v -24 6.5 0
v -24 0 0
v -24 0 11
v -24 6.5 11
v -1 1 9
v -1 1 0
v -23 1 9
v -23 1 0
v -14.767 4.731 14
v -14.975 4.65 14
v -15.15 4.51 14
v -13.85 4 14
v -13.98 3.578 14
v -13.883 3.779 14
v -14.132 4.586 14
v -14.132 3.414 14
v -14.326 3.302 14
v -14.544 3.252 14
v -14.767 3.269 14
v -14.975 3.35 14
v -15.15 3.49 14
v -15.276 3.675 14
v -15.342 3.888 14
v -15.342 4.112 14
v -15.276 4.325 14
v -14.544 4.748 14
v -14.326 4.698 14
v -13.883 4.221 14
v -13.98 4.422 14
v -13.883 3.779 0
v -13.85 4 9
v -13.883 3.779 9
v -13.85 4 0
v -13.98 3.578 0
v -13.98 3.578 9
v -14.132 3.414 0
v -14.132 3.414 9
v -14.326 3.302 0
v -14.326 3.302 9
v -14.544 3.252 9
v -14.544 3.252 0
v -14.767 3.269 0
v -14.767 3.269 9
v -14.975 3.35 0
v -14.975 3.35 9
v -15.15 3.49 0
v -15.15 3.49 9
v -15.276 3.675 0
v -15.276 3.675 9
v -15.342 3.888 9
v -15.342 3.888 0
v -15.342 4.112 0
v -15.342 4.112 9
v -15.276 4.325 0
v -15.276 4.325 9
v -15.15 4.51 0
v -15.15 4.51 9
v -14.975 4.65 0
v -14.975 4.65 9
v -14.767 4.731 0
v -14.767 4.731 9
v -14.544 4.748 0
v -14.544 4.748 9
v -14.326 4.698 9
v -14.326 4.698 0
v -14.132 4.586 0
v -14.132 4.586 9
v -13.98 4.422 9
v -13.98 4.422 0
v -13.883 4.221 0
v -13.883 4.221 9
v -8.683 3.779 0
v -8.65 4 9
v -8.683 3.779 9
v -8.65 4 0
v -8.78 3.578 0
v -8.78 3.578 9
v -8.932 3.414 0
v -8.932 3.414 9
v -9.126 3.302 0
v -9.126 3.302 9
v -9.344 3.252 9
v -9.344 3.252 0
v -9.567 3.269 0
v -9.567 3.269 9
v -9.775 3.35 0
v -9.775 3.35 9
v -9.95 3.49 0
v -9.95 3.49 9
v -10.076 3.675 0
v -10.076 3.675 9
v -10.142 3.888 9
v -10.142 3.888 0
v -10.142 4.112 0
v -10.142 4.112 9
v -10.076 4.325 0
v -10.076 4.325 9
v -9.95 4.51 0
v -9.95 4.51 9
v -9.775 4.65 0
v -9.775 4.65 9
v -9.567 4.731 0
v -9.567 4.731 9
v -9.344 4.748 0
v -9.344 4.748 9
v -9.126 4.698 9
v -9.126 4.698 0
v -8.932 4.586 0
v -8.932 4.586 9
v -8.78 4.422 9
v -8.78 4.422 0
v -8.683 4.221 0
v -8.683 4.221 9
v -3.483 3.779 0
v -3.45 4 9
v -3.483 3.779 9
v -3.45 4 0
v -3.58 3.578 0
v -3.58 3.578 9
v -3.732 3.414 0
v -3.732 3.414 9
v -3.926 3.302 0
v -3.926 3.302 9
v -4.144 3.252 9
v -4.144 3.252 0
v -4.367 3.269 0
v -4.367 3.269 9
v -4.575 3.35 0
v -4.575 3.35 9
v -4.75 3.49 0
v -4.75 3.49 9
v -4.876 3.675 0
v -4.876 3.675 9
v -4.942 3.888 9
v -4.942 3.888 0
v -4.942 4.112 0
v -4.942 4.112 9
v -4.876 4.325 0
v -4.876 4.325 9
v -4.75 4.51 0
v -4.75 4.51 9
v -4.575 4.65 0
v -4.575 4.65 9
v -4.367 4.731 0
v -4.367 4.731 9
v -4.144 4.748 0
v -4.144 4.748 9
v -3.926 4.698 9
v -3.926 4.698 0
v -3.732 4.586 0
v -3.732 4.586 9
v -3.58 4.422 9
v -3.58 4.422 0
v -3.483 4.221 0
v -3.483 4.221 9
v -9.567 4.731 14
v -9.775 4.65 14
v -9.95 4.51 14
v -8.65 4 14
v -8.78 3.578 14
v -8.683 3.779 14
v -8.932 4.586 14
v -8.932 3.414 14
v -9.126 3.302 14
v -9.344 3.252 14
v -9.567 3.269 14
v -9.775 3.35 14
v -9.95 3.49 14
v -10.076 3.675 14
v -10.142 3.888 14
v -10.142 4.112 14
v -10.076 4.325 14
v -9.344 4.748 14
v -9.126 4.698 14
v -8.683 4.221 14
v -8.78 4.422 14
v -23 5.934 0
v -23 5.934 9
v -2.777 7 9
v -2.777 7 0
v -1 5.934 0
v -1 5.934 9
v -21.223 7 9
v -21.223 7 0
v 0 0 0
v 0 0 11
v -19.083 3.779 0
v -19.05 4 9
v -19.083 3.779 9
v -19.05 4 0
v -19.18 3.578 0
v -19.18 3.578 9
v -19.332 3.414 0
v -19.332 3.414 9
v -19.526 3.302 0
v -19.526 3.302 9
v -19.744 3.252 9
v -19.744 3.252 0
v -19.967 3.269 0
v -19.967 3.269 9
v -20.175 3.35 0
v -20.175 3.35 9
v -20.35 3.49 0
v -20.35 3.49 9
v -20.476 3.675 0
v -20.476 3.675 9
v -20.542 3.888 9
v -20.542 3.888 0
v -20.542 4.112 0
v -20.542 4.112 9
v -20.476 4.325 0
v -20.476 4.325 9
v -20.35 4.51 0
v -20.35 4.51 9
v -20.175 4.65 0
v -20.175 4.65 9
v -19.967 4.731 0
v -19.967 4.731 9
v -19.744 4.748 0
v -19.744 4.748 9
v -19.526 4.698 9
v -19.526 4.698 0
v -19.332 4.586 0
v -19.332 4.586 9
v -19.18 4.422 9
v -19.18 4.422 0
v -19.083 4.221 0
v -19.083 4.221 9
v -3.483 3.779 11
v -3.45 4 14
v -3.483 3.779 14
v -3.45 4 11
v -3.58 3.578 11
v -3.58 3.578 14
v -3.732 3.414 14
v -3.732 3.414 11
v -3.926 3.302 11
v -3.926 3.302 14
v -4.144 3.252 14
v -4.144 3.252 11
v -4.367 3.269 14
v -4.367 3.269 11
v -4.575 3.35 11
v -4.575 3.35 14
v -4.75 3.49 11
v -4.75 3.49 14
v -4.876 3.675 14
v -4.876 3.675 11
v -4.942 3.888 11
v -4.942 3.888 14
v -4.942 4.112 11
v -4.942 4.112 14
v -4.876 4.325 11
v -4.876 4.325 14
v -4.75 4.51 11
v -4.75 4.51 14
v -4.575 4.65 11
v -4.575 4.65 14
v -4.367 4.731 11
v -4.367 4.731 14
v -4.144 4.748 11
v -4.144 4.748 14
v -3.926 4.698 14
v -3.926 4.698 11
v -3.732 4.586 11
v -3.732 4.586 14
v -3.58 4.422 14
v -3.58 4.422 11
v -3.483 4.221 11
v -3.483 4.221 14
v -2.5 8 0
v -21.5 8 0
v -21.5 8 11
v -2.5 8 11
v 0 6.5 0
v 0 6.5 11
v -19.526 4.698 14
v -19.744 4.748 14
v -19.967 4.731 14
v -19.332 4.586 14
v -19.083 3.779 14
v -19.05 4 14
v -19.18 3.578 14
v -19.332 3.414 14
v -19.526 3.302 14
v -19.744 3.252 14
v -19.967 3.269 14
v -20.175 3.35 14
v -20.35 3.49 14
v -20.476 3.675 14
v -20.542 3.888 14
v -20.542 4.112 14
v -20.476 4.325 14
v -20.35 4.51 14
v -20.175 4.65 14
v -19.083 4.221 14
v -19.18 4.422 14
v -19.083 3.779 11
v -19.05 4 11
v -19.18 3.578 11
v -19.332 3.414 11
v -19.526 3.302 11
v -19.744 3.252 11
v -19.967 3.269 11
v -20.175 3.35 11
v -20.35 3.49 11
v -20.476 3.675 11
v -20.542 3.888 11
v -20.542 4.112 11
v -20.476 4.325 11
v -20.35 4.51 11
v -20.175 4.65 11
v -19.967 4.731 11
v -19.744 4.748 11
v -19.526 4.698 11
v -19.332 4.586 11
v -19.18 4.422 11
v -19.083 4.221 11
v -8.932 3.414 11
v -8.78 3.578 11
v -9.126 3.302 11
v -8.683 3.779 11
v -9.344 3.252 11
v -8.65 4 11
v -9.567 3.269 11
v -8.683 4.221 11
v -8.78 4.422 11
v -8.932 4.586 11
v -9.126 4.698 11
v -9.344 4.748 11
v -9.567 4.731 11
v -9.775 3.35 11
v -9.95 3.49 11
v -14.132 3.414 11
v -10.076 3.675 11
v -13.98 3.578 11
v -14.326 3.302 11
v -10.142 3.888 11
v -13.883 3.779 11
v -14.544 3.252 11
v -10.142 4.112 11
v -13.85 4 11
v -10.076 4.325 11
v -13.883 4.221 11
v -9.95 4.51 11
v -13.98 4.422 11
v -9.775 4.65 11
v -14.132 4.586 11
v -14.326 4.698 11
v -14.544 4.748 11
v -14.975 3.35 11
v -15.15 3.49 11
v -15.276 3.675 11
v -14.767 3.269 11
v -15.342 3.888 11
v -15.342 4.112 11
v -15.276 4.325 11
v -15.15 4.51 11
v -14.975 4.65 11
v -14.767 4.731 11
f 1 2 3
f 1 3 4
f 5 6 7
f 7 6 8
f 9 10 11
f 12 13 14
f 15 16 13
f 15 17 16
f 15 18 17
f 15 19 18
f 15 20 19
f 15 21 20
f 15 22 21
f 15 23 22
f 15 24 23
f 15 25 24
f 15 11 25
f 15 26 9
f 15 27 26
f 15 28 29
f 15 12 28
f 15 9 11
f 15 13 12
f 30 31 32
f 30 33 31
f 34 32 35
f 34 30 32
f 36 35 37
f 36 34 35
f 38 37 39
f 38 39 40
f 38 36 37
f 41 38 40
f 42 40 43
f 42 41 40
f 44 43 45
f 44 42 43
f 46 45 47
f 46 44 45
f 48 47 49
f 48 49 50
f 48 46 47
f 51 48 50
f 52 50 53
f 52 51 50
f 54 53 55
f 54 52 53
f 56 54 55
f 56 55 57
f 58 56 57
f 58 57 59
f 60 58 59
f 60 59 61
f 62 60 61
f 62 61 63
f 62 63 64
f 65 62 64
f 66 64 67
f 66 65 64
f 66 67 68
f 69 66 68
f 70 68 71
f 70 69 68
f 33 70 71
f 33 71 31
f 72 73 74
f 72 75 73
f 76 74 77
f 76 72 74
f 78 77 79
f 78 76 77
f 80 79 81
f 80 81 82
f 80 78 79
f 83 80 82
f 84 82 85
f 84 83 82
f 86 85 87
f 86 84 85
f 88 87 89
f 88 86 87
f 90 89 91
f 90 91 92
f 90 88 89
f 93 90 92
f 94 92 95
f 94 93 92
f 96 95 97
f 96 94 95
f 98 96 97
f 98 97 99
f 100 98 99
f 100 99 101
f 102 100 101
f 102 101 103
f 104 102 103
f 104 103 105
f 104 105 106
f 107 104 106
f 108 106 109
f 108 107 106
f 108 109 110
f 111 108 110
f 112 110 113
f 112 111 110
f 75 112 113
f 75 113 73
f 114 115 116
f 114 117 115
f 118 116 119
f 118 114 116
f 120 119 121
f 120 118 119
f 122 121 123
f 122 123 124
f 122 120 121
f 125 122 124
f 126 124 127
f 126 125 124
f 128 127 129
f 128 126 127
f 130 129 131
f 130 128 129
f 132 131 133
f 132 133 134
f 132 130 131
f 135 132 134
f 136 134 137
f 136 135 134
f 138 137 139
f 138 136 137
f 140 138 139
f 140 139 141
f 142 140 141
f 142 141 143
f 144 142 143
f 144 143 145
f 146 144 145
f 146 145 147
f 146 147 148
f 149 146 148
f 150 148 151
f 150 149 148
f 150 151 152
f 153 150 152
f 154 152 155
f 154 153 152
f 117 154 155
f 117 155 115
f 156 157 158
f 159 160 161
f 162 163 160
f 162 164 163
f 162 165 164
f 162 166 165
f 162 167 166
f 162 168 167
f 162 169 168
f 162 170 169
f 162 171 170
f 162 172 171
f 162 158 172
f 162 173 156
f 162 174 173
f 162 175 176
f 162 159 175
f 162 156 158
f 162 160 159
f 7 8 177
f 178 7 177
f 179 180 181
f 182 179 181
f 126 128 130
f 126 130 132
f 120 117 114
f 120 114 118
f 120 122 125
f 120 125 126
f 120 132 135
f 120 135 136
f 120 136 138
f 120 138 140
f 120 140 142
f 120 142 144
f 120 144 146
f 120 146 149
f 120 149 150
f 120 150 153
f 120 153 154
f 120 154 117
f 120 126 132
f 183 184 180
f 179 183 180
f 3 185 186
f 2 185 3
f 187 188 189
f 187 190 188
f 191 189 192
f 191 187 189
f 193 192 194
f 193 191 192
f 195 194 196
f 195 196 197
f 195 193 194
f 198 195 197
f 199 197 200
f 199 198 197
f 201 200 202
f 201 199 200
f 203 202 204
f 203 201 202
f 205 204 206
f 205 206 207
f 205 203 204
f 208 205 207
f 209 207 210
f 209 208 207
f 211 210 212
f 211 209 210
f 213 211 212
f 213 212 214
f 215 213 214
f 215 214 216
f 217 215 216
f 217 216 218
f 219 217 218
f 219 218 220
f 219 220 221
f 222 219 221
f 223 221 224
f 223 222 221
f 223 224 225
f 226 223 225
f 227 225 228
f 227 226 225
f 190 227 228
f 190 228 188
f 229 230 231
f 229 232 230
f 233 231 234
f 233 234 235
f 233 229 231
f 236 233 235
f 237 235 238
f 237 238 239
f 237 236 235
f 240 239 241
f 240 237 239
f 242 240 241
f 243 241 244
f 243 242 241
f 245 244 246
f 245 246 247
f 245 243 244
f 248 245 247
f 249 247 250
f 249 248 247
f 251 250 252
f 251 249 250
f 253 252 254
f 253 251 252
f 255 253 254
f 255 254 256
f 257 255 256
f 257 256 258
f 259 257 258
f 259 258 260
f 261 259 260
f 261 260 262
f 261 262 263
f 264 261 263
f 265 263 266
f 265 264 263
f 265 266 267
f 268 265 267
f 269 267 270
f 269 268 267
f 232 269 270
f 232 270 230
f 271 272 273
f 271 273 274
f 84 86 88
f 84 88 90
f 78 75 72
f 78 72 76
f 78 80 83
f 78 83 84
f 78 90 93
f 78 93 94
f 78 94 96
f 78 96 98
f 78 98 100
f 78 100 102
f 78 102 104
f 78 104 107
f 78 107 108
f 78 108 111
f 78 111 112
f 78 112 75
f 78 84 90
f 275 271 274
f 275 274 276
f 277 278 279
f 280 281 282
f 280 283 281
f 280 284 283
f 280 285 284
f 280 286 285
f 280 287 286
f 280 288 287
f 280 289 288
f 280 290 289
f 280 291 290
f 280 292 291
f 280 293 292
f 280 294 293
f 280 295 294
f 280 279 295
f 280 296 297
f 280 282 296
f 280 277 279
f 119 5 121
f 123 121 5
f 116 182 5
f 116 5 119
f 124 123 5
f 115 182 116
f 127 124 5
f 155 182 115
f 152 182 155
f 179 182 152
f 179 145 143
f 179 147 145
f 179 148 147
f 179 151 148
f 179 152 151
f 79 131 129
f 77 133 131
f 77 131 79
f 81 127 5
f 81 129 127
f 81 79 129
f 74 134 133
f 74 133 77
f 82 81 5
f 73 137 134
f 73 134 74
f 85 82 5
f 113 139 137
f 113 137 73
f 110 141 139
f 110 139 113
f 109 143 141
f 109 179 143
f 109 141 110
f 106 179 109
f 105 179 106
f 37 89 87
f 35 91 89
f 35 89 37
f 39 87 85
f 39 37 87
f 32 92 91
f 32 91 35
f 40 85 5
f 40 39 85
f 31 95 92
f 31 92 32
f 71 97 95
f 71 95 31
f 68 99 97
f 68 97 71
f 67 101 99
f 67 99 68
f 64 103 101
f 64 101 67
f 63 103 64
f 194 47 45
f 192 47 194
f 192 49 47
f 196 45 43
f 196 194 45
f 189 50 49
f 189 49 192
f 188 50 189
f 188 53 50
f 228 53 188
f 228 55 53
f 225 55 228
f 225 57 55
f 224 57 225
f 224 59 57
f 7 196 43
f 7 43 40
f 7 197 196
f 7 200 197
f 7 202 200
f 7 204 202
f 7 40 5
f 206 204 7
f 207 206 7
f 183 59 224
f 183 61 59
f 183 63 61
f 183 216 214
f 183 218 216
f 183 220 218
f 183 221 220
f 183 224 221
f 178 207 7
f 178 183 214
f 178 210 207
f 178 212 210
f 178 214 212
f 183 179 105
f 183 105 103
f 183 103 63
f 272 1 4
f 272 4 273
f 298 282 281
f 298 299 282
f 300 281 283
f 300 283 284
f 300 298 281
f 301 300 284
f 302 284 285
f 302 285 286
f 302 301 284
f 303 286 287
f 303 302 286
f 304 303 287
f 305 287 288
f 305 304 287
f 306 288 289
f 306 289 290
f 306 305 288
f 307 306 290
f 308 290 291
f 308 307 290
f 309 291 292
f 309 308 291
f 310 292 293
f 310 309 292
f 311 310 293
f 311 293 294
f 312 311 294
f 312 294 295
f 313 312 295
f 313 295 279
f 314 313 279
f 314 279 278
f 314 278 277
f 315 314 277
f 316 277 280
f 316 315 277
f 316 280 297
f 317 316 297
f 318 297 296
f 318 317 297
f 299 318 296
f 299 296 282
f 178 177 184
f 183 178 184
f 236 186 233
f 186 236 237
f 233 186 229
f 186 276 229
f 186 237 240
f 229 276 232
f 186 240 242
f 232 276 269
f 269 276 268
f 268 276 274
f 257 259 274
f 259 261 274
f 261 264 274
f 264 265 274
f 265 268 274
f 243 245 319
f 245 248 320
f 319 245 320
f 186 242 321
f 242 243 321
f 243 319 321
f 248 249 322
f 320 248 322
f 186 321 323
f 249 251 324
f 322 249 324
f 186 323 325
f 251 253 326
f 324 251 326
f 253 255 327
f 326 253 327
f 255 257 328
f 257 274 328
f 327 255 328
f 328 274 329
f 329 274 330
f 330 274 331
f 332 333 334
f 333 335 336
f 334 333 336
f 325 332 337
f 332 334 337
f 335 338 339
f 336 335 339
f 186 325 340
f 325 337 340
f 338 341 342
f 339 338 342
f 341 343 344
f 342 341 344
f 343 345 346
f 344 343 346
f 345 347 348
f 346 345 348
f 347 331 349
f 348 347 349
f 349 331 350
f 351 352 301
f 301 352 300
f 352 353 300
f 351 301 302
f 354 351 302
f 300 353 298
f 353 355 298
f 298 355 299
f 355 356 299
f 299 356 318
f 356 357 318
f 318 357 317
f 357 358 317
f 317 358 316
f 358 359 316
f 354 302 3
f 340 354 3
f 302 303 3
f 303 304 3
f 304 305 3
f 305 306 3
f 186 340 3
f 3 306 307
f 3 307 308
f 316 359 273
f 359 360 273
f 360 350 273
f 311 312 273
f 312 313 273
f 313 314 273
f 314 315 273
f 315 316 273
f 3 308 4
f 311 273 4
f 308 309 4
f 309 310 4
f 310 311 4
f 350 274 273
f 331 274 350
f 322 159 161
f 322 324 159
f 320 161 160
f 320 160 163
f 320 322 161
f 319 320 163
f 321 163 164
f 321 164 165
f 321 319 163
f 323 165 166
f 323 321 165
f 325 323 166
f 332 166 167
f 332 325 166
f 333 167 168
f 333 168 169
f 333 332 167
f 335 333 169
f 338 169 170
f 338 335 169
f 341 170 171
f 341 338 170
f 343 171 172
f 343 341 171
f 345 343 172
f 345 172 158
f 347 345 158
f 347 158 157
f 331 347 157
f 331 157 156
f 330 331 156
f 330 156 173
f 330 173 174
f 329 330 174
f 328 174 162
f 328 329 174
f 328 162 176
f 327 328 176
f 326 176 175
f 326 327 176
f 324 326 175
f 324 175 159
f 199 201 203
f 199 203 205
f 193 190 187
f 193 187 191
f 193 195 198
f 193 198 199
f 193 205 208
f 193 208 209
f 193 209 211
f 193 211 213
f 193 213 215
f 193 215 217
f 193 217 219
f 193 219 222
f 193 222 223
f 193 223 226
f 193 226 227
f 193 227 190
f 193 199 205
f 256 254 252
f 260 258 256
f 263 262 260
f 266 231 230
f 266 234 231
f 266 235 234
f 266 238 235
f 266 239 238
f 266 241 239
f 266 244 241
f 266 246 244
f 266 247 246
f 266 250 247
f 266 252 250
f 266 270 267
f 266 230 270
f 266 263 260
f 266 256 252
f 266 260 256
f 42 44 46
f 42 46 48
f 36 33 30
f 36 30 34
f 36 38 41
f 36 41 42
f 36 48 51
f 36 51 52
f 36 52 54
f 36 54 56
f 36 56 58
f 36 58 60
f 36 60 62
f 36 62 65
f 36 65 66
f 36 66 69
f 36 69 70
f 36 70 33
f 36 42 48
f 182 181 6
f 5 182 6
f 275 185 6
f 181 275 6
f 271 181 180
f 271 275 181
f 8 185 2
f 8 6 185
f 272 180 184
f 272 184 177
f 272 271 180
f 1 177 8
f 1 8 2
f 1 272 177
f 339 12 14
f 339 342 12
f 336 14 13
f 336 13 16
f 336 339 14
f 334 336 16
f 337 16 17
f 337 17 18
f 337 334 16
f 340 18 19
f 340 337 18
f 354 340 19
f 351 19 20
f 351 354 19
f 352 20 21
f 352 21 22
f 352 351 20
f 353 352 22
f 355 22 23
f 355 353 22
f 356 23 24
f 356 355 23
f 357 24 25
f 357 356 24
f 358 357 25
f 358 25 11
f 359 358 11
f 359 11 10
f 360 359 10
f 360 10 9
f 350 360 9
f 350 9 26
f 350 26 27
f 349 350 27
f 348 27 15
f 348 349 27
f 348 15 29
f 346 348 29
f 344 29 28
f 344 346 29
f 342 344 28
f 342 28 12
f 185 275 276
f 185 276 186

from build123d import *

# Parameters (mm, degrees)
EXTRUDE_1_DEPTH        = 11
CUT_EXTRUDE_1_DEPTH    = 9
SKETCH_3_R             = 0.75
EXTRUDE_2_DEPTH        = 9
SKETCH_4_R             = 1.77312928
CUT_EXTRUDE_2_DEPTH    = 4
PATTERN_LINEAR_1_COUNT = 4
PATTERN_LINEAR_1_PITCH = 5.2


with BuildPart() as part:
    # 草图1 → 凸台-拉伸1 (new body)
    with BuildSketch(Plane.XY):
        Polygon((0, 0), (-24, 0), (-24, 6.5), (-21.5, 8), (-2.5, 8), (0, 6.5), align=None)
    extrude(amount=EXTRUDE_1_DEPTH)

    # 草图2 → 切除-拉伸1 (cut)
    with BuildSketch(Plane(origin=(0, 0, 0), x_dir=(-1, 0, 0), z_dir=(0, 0, -1))):
        Polygon((1, 5.933809621), (1, 1), (23, 1), (23, 5.933809621), (21.223016035, 7), (2.776983965, 7), align=None)
    extrude(amount=-CUT_EXTRUDE_1_DEPTH, mode=Mode.SUBTRACT)

    # 草图3 → 凸台-拉伸2 (add, symmetric)
    with BuildSketch(Plane(origin=(0, 0, 9), x_dir=(-1, 0, 0), z_dir=(0, 0, -1))):
        with Locations(Location((4.2, 4, 0), (0, 0, 180))):
            Circle(SKETCH_3_R)
    extrude_2 = extrude(amount=EXTRUDE_2_DEPTH, both=True)

    # 草图4 → 切除-拉伸2 (cut)
    with BuildSketch(Plane.XY.offset(18)):
        with Locations((-4.2, 4)):
            Circle(SKETCH_4_R)
    cut_extrude_2 = extrude(amount=-CUT_EXTRUDE_2_DEPTH, mode=Mode.SUBTRACT)

    # 阵列(线性)1: 凸台-拉伸2, 切除-拉伸2 ×4
    with Locations(*[(-i * PATTERN_LINEAR_1_PITCH, 0, 0) for i in range(1, PATTERN_LINEAR_1_COUNT)]):
        add(extrude_2)
        add(cut_extrude_2, mode=Mode.SUBTRACT)


solid = part.part
